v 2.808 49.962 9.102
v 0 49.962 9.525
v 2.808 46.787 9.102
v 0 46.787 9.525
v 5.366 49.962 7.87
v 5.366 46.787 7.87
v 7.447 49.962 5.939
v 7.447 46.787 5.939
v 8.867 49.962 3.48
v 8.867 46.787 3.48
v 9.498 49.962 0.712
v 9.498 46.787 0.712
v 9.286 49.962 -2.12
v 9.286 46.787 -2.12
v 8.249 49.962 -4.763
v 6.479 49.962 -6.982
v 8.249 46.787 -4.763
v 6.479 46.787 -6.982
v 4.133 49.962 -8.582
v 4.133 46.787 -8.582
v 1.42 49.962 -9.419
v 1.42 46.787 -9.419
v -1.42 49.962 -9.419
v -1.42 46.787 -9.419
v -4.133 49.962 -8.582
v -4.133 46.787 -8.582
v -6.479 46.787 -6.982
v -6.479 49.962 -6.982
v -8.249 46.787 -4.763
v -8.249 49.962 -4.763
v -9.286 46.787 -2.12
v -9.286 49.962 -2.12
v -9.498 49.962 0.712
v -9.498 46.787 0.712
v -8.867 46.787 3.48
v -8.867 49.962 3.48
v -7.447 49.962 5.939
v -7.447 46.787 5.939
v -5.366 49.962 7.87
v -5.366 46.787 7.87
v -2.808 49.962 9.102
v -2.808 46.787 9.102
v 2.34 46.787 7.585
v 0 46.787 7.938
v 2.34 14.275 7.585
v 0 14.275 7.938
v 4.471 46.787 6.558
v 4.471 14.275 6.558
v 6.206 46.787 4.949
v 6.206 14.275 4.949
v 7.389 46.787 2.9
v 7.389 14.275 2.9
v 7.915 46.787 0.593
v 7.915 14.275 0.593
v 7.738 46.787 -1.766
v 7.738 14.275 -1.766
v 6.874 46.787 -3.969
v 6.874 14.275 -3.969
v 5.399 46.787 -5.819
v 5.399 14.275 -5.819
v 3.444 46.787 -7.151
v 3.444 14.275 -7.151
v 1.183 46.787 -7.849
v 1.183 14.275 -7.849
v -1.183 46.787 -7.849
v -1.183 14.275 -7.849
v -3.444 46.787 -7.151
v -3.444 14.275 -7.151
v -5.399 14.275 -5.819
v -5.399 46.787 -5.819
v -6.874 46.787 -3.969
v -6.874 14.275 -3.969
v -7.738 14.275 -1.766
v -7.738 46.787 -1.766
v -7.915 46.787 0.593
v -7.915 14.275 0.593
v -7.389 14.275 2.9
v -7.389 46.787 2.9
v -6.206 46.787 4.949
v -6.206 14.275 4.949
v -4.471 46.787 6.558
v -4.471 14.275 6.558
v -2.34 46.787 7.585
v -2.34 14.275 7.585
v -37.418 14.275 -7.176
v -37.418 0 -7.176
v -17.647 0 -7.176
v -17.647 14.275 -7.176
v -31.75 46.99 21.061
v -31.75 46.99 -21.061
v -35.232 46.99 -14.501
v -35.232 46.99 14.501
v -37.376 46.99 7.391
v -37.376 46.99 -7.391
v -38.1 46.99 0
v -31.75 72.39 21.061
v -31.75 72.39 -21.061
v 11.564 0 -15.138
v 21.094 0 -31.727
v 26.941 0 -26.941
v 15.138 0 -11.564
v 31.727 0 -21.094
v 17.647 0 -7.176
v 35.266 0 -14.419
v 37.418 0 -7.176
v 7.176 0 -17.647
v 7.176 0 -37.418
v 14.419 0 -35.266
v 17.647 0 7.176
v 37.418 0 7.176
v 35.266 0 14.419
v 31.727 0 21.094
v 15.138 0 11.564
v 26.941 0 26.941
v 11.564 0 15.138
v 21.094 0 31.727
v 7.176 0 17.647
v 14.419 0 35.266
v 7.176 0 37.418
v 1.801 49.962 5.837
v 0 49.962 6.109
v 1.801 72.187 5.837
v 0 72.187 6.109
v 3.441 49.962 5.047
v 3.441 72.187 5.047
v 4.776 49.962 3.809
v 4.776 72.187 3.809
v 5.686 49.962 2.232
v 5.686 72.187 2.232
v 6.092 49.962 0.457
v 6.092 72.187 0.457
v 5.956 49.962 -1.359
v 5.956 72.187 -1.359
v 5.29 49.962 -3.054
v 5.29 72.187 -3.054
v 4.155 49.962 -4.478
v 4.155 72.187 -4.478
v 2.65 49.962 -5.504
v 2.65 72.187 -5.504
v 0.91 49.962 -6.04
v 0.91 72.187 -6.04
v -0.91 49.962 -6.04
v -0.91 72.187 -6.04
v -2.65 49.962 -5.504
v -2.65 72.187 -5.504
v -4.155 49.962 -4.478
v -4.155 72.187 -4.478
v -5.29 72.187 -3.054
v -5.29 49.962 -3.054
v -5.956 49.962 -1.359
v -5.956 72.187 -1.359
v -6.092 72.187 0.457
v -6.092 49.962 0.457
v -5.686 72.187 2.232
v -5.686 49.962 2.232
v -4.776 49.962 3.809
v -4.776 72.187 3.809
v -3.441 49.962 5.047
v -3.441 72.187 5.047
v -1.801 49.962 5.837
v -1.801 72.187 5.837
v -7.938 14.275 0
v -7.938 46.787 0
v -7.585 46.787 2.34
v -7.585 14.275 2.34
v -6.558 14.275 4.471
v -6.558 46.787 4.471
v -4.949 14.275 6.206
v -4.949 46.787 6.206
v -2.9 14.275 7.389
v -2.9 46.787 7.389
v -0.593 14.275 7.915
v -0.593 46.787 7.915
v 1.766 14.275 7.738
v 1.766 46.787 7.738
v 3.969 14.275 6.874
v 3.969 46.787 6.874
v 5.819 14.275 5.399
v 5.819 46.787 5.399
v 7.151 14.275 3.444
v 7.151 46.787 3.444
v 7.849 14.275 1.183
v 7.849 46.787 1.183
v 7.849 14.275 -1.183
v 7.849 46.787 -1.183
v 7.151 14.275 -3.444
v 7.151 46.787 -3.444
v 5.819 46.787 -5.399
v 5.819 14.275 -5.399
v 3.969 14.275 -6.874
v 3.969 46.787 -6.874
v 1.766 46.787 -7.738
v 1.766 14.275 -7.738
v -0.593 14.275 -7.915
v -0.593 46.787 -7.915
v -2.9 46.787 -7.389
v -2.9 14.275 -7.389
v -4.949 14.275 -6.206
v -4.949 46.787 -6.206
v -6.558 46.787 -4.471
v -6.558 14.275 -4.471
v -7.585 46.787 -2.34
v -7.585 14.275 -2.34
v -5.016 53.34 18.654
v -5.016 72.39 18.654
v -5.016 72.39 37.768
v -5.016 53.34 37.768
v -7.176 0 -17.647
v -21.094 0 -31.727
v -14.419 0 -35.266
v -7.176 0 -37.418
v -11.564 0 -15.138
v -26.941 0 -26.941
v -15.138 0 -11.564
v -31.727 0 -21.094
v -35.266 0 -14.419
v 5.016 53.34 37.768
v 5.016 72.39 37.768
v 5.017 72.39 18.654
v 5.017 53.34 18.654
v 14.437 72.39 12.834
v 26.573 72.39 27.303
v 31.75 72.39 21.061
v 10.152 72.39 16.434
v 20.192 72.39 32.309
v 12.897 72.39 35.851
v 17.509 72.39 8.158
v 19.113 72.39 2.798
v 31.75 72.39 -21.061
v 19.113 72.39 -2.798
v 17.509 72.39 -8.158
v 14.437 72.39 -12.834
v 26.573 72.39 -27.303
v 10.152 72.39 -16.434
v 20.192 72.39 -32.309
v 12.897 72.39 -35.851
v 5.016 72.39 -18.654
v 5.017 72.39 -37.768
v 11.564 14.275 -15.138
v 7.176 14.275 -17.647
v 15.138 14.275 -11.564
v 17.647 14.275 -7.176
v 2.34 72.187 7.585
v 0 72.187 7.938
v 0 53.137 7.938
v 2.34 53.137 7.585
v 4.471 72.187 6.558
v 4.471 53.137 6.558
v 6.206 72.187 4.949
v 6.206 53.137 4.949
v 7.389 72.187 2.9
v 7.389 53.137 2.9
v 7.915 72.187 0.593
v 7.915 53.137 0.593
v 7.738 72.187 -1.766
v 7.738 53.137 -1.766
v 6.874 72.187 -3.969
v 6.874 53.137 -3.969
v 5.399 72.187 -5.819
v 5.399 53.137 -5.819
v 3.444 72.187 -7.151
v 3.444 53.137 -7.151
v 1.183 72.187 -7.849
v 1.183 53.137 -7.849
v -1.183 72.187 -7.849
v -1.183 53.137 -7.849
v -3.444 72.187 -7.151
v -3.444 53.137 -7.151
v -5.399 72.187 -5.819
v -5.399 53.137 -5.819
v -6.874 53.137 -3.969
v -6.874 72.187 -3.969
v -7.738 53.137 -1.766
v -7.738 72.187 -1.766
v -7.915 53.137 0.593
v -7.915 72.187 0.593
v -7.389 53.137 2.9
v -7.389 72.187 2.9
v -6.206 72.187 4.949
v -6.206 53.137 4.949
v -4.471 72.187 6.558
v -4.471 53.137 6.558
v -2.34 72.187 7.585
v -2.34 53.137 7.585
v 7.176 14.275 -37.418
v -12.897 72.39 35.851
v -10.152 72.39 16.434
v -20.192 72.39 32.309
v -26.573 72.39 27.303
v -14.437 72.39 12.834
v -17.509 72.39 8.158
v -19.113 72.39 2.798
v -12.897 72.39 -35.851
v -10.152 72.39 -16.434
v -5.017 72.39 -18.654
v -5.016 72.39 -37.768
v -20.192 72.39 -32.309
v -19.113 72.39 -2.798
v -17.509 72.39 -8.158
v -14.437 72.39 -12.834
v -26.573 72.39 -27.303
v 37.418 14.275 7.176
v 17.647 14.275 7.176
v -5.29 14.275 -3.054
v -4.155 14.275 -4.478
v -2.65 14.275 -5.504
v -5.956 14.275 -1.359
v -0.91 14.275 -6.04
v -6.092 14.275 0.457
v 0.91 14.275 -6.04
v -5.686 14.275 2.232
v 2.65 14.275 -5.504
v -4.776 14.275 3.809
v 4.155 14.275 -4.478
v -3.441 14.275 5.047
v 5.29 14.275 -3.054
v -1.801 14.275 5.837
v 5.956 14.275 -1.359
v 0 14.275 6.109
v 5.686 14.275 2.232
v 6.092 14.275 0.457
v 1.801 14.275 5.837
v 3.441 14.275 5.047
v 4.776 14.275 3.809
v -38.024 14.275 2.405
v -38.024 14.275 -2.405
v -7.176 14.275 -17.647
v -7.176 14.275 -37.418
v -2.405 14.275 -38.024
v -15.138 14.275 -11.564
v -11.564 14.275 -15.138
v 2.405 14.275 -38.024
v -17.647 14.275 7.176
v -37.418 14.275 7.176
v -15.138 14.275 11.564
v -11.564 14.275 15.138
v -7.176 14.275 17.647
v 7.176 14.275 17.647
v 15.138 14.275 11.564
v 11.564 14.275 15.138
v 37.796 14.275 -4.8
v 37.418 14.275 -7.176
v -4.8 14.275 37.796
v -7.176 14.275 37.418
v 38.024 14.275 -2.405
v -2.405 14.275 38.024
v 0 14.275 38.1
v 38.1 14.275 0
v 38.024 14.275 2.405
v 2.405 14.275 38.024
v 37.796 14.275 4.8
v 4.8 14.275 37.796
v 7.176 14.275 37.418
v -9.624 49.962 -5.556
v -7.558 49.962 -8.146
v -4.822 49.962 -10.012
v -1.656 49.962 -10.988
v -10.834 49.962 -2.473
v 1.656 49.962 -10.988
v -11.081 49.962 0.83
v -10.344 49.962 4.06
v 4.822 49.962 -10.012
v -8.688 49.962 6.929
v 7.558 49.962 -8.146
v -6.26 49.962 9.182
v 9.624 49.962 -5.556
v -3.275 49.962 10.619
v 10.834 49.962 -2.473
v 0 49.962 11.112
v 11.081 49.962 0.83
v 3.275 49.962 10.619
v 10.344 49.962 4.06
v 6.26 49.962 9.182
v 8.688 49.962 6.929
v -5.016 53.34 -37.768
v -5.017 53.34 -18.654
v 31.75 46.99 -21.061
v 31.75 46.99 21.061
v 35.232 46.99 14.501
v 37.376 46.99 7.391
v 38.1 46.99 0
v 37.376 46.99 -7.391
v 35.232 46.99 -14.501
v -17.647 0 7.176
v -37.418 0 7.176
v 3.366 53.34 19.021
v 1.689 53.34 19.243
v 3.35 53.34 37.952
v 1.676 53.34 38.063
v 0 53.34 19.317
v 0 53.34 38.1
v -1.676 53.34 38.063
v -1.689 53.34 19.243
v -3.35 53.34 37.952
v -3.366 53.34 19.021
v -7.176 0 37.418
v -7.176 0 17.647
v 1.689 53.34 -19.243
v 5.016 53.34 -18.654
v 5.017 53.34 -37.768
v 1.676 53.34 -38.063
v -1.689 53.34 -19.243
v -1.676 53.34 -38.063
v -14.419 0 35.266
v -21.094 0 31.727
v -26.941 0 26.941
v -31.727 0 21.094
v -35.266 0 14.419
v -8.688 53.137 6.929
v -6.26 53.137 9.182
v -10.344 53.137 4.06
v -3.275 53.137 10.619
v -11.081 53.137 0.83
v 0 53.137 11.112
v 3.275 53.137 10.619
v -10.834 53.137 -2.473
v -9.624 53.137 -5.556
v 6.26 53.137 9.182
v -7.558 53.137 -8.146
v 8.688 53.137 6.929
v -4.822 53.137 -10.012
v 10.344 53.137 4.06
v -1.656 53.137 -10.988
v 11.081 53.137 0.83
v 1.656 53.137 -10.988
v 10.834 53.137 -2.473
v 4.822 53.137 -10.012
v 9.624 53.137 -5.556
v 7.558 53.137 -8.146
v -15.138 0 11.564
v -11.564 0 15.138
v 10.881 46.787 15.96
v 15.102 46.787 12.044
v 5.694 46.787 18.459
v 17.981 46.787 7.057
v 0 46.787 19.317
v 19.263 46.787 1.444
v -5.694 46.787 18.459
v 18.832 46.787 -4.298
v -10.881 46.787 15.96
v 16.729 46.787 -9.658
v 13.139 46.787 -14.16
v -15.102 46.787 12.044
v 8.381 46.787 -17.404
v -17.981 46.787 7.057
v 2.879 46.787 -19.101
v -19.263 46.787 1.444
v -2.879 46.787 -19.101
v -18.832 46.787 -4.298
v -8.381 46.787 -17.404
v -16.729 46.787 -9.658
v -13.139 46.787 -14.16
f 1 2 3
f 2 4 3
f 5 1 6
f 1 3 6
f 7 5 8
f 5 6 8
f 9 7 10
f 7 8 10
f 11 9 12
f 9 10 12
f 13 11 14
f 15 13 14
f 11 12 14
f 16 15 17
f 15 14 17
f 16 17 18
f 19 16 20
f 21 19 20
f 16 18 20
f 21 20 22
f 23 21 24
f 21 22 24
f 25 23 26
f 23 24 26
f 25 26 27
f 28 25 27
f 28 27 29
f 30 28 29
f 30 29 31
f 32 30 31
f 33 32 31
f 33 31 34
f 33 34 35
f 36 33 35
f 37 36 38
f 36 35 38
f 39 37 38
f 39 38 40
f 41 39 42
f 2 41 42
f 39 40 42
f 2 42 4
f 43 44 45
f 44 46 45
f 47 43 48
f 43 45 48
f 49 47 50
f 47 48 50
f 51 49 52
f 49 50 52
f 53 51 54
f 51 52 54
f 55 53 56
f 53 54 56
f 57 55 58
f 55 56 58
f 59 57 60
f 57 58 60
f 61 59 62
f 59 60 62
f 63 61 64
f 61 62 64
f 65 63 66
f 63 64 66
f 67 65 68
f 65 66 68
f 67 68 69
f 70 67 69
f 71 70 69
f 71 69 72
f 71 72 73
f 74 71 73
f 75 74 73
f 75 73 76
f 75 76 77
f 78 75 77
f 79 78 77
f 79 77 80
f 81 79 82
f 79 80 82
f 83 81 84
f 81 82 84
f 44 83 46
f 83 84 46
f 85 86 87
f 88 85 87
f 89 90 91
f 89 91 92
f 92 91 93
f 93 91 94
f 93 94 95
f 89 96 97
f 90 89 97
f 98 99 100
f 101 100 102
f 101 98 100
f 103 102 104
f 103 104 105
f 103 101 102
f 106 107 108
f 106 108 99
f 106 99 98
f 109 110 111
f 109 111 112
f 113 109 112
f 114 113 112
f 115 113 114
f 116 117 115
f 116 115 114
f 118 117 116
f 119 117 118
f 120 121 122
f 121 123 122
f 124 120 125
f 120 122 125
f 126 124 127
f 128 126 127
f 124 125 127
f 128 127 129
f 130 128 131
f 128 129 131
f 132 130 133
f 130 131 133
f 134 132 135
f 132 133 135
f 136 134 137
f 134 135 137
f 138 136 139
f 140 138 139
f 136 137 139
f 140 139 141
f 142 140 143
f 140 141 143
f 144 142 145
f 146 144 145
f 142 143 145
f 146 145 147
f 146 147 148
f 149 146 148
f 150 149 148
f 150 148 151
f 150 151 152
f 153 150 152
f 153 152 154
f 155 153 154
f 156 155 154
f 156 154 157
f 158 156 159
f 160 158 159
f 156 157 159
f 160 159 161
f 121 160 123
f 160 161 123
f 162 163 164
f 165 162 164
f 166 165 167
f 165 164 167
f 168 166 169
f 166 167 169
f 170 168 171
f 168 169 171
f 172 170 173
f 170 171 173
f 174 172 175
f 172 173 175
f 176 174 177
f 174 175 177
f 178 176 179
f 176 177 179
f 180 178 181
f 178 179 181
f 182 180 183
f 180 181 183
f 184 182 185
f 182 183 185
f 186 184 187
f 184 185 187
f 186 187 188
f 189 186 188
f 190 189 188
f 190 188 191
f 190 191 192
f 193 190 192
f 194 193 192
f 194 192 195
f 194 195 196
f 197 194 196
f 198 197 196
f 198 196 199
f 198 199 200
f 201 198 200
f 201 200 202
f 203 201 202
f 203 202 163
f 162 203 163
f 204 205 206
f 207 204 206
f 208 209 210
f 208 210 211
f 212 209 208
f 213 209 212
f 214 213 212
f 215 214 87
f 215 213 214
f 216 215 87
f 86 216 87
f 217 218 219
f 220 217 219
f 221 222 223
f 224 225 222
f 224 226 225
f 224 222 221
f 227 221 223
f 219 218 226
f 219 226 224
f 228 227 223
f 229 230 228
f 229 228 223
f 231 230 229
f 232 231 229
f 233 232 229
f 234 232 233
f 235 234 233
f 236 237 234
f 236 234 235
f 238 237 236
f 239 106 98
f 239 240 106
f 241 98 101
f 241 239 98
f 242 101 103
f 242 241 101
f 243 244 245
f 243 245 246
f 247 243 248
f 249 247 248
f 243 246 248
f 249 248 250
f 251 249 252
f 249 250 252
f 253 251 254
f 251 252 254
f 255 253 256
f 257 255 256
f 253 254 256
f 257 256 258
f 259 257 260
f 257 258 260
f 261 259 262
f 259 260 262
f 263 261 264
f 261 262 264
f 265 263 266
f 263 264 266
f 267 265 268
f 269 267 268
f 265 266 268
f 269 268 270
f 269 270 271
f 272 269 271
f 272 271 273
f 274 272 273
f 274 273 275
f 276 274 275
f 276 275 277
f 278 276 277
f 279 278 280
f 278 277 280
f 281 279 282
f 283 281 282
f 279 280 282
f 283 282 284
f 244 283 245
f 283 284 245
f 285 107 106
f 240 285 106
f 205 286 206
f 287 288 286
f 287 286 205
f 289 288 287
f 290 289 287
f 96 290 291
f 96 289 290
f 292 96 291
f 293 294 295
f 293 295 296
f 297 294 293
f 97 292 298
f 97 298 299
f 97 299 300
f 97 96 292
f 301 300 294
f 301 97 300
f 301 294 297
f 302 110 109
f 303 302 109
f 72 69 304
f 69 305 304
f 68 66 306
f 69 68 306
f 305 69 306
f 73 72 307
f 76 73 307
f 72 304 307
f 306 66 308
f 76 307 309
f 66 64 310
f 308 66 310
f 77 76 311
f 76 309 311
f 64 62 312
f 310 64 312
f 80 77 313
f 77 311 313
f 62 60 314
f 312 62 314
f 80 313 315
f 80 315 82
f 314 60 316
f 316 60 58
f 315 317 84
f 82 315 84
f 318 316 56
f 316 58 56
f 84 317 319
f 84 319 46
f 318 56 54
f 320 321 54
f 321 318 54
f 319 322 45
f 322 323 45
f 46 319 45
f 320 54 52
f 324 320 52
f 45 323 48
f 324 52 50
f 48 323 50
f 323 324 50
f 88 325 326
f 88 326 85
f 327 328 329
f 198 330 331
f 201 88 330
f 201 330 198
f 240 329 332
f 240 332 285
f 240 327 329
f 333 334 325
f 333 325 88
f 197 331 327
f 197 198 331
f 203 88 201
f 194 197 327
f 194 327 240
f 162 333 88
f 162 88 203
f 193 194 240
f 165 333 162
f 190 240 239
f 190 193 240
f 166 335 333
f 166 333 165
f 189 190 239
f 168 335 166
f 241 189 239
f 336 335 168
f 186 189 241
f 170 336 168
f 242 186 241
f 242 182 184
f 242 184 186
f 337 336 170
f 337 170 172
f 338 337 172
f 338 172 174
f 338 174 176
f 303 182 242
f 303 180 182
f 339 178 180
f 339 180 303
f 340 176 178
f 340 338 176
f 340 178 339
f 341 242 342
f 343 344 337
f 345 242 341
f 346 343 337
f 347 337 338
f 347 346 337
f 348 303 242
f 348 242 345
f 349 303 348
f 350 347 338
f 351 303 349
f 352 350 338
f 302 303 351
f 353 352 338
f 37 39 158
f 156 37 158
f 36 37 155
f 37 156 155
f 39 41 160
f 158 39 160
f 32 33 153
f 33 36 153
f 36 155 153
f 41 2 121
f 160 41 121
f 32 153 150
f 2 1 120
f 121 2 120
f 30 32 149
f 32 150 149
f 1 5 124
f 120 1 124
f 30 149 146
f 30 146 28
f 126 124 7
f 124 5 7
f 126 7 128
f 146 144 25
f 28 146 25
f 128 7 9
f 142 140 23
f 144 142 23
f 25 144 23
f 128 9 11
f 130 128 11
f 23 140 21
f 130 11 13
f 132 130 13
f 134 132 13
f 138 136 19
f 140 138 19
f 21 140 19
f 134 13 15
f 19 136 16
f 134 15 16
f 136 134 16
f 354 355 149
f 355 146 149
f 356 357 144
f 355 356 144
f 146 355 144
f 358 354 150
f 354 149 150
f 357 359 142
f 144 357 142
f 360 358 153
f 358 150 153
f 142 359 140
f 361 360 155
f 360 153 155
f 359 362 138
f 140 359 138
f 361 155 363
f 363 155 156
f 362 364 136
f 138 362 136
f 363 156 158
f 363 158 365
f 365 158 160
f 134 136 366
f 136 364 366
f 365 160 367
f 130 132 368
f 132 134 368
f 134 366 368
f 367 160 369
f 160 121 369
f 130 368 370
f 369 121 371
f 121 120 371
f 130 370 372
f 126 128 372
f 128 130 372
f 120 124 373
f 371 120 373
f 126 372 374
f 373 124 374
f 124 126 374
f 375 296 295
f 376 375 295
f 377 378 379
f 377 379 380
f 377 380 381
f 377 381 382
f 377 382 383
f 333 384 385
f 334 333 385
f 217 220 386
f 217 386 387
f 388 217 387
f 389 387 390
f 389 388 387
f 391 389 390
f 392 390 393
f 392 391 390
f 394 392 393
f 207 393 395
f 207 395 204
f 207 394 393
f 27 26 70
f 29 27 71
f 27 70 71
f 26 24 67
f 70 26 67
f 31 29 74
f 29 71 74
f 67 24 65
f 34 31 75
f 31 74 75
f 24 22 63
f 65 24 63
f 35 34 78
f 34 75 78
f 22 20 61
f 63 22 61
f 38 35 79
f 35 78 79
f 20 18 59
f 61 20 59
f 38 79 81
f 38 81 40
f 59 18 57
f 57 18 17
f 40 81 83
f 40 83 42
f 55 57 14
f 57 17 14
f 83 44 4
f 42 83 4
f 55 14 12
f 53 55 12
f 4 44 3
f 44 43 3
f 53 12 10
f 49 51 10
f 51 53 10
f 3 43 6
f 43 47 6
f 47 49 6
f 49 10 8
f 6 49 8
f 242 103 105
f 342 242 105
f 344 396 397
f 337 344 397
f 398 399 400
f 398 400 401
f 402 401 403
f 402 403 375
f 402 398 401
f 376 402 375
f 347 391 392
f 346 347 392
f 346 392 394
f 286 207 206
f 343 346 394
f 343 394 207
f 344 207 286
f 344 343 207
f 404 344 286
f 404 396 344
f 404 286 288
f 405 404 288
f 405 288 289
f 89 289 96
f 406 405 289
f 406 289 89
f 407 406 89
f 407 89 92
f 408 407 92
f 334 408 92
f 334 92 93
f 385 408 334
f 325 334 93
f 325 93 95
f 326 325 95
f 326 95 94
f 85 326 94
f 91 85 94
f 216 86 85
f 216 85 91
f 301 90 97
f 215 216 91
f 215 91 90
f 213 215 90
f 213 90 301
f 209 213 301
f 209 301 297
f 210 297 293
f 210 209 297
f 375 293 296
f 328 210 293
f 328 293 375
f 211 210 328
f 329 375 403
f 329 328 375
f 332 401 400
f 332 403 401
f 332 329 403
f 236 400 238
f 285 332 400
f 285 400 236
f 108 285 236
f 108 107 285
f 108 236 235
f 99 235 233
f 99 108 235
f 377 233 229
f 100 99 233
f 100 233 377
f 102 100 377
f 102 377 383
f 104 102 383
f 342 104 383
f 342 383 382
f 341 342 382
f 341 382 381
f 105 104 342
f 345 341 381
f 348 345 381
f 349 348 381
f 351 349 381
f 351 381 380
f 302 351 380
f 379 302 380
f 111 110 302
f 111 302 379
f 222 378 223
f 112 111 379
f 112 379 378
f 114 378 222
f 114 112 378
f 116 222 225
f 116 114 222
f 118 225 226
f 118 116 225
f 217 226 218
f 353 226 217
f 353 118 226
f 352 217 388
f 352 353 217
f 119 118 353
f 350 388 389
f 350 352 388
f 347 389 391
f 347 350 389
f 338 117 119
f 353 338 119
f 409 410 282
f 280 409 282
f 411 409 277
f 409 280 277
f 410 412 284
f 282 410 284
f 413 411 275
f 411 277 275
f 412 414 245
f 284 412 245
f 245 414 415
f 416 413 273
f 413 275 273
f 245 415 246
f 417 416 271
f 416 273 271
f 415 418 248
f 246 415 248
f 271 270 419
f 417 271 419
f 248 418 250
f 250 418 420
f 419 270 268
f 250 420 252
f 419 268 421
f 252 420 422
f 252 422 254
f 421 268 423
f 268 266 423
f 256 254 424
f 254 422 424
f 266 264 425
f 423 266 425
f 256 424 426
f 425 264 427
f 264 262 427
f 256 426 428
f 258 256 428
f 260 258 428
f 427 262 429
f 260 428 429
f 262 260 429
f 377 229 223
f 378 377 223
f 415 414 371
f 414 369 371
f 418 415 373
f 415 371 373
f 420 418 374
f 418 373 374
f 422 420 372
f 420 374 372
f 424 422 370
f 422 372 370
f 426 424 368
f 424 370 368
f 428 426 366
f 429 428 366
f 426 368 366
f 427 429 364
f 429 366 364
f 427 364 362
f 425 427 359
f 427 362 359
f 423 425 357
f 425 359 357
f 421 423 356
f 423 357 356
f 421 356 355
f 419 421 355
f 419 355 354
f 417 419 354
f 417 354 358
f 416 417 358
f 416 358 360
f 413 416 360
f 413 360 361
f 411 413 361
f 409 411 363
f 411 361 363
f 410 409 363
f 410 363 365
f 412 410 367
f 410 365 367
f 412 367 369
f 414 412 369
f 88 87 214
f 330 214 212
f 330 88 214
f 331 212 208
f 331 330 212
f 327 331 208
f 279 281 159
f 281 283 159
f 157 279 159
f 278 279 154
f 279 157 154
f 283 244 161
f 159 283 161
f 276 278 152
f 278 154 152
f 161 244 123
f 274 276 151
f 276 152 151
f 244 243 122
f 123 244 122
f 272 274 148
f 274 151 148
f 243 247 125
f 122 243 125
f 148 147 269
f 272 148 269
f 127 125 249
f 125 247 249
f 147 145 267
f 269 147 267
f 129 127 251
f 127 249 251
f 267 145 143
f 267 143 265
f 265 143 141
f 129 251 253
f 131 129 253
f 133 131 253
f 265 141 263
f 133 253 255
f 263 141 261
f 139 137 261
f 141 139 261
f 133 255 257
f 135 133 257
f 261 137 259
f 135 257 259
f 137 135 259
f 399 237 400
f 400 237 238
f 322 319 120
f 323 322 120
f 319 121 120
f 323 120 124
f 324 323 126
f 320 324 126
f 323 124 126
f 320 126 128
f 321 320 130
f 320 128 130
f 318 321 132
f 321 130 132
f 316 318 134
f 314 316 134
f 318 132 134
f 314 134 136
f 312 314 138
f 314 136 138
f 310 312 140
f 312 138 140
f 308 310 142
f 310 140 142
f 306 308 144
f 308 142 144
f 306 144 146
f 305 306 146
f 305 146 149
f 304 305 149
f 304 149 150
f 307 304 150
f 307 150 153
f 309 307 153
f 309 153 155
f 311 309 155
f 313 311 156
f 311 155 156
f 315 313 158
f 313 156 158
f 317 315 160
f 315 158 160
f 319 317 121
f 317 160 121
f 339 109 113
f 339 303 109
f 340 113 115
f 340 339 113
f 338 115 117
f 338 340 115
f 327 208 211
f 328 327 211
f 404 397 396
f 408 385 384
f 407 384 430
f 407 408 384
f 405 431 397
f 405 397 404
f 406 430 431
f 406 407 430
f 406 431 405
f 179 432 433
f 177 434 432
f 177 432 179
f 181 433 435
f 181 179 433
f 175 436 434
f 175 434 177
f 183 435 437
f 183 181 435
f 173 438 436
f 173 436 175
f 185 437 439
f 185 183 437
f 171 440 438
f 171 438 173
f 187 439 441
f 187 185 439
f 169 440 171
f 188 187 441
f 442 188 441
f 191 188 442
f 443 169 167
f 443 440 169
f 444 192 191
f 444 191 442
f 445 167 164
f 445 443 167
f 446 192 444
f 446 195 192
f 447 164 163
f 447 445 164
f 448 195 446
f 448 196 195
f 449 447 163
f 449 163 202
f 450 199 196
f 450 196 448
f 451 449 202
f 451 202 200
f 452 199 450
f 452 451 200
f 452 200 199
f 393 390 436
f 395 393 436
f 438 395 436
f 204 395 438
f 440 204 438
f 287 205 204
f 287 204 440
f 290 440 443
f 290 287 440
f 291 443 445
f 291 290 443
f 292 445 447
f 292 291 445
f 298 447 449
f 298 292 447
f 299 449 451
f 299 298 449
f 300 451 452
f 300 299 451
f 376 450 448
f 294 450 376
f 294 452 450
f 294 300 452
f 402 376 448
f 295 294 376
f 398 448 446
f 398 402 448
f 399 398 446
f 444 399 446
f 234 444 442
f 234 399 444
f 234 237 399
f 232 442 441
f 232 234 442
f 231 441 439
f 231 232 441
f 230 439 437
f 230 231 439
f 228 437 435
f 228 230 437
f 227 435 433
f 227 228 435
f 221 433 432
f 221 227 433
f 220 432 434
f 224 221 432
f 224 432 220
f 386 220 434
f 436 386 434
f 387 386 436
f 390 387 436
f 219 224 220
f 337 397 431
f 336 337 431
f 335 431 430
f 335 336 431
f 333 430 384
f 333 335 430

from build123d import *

# Parameters (mm, degrees)
F3_D     = 15.875
F5_DEPTH = 14.2748
F7_DEPTH = 25.4
F9_DEPTH = 19.05


with BuildPart() as f1:
    # F0 (on Right) → F1 (revolve)
    with BuildSketch(Plane.YZ):
        Polygon((0, 38.1), (0, 19.05), (14.2748, 19.05), (14.2748, 0), (46.7868, 0), (46.7868, 19.3167), (72.39, 19.3167), (72.39, 38.1), align=None)
    revolve(axis=Axis((0, 30.5308, 0), (0, -1, 0)))

    # F3 (through all)
    with Locations(Plane.XZ.offset(-14.2748)):
        with Locations((0, 0)):
            Hole(F3_D / 2)

    # F4 (on face) → F5 (cut, through all)
    with BuildSketch(Plane.XZ):
        with BuildLine():
            Line((-7.1755, 37.418206795), (-7.1755, 17.6469459043))
            ThreePointArc((-7.1755, 17.6469459043), (0, 19.05), (7.1755, 17.6469459043))
            Line((7.1755, 17.6469459043), (7.1755, 37.418206795))
            ThreePointArc((7.1755, 37.418206795), (0, 38.1), (-7.1755, 37.418206795))
        make_face()
        with BuildLine():
            ThreePointArc((-17.6469459043, -7.1755), (-19.05, 0), (-17.6469459043, 7.1755))
            Line((-17.6469459043, 7.1755), (-37.418206795, 7.1755))
            ThreePointArc((-37.418206795, 7.1755), (-38.1, 0), (-37.418206795, -7.1755))
            Line((-37.418206795, -7.1755), (-17.6469459043, -7.1755))
        make_face()
        with BuildLine():
            Line((37.418206795, 7.1755), (17.6469459043, 7.1755))
            ThreePointArc((17.6469459043, 7.1755), (18.6959463451, 3.6556928565), (19.05, 0))
            ThreePointArc((19.05, 0), (18.6959463451, -3.6556928565), (17.6469459043, -7.1755))
            Line((17.6469459043, -7.1755), (37.418206795, -7.1755))
            ThreePointArc((37.418206795, -7.1755), (37.9291687154, -3.603909066), (38.1, 0))
            ThreePointArc((38.1, 0), (37.9291687154, 3.603909066), (37.418206795, 7.1755))
        make_face()
        with BuildLine():
            ThreePointArc((7.1755, -17.6469459043), (0, -19.05), (-7.1755, -17.6469459043))
            Line((-7.1755, -17.6469459043), (-7.1755, -37.418206795))
            ThreePointArc((-7.1755, -37.418206795), (0, -38.1), (7.1755, -37.418206795))
            Line((7.1755, -37.418206795), (7.1755, -17.6469459043))
        make_face()
    extrude(amount=-F5_DEPTH, mode=Mode.SUBTRACT)

    # F6 (on face) → F7 (cut)
    with BuildSketch(Plane(origin=(0, 72.39, 0), x_dir=(-1, 0, 0), z_dir=(0, 1, 0))):
        with BuildLine():
            Line((-31.75, -21.0605674188), (-31.75, 21.0605674188))
            ThreePointArc((-31.75, 21.0605674188), (-38.1, 0), (-31.75, -21.0605674188))
        make_face()
        with BuildLine():
            ThreePointArc((38.1, 0), (36.4779728055, 10.9985226281), (31.75, 21.0605674188))
            Line((31.75, 21.0605674188), (31.75, -21.0605674188))
            ThreePointArc((31.75, -21.0605674188), (36.4779728055, -10.9985226281), (38.1, 0))
        make_face()
    extrude(amount=-F7_DEPTH, mode=Mode.SUBTRACT)

    # F8 (on face) → F9 (cut)
    with BuildSketch(Plane(origin=(0, 72.39, 0), x_dir=(-1, 0, 0), z_dir=(0, 1, 0))):
        with BuildLine():
            ThreePointArc((0, 38.1), (-2.5137270639, 38.0169853651), (-5.0165, 37.7683032151))
            Line((-5.0165, 37.7683032151), (-5.0165, 18.6539439969))
            ThreePointArc((-5.0165, 18.6539439969), (0, 19.3167), (5.0165, 18.6539439969))
            Line((5.0165, 18.6539439969), (5.0165, 37.7683032151))
            ThreePointArc((5.0165, 37.7683032151), (2.5137270639, 38.0169853651), (0, 38.1))
        make_face()
        with BuildLine():
            ThreePointArc((5.0165, -18.6539439969), (0, -19.3167), (-5.0165, -18.6539439969))
            Line((-5.0165, -18.6539439969), (-5.0165, -37.7683032151))
            ThreePointArc((-5.0165, -37.7683032151), (0, -38.1), (5.0165, -37.7683032151))
            Line((5.0165, -37.7683032151), (5.0165, -18.6539439969))
        make_face()
    extrude(amount=-F9_DEPTH, mode=Mode.SUBTRACT)


with BuildPart() as f11:
    # F10 (on Right) → F11 (revolve)
    with BuildSketch(Plane.YZ):
        Polygon((46.7868, 7.9375), (14.2748, 7.9375), (14.2748, 6.1087), (49.9618, 6.1087), (49.9618, 9.525), (46.7868, 9.525), align=None)
    revolve(axis=Axis((0, 25.5515109748, 0), (0, 1, 0)))


with BuildPart() as f13:
    # F12 (on Right) → F13 (revolve)
    with BuildSketch(Plane.YZ):
        Polygon((53.1368, 11.1125), (49.9618, 11.1125), (49.9618, 6.1087), (72.1868, 6.1087), (72.1868, 7.9375), (53.1368, 7.9375), align=None)
    revolve(axis=Axis((0, 65.3520311519, 0), (0, 1, 0)))


solid = Compound([f1.part, f11.part, f13.part])
